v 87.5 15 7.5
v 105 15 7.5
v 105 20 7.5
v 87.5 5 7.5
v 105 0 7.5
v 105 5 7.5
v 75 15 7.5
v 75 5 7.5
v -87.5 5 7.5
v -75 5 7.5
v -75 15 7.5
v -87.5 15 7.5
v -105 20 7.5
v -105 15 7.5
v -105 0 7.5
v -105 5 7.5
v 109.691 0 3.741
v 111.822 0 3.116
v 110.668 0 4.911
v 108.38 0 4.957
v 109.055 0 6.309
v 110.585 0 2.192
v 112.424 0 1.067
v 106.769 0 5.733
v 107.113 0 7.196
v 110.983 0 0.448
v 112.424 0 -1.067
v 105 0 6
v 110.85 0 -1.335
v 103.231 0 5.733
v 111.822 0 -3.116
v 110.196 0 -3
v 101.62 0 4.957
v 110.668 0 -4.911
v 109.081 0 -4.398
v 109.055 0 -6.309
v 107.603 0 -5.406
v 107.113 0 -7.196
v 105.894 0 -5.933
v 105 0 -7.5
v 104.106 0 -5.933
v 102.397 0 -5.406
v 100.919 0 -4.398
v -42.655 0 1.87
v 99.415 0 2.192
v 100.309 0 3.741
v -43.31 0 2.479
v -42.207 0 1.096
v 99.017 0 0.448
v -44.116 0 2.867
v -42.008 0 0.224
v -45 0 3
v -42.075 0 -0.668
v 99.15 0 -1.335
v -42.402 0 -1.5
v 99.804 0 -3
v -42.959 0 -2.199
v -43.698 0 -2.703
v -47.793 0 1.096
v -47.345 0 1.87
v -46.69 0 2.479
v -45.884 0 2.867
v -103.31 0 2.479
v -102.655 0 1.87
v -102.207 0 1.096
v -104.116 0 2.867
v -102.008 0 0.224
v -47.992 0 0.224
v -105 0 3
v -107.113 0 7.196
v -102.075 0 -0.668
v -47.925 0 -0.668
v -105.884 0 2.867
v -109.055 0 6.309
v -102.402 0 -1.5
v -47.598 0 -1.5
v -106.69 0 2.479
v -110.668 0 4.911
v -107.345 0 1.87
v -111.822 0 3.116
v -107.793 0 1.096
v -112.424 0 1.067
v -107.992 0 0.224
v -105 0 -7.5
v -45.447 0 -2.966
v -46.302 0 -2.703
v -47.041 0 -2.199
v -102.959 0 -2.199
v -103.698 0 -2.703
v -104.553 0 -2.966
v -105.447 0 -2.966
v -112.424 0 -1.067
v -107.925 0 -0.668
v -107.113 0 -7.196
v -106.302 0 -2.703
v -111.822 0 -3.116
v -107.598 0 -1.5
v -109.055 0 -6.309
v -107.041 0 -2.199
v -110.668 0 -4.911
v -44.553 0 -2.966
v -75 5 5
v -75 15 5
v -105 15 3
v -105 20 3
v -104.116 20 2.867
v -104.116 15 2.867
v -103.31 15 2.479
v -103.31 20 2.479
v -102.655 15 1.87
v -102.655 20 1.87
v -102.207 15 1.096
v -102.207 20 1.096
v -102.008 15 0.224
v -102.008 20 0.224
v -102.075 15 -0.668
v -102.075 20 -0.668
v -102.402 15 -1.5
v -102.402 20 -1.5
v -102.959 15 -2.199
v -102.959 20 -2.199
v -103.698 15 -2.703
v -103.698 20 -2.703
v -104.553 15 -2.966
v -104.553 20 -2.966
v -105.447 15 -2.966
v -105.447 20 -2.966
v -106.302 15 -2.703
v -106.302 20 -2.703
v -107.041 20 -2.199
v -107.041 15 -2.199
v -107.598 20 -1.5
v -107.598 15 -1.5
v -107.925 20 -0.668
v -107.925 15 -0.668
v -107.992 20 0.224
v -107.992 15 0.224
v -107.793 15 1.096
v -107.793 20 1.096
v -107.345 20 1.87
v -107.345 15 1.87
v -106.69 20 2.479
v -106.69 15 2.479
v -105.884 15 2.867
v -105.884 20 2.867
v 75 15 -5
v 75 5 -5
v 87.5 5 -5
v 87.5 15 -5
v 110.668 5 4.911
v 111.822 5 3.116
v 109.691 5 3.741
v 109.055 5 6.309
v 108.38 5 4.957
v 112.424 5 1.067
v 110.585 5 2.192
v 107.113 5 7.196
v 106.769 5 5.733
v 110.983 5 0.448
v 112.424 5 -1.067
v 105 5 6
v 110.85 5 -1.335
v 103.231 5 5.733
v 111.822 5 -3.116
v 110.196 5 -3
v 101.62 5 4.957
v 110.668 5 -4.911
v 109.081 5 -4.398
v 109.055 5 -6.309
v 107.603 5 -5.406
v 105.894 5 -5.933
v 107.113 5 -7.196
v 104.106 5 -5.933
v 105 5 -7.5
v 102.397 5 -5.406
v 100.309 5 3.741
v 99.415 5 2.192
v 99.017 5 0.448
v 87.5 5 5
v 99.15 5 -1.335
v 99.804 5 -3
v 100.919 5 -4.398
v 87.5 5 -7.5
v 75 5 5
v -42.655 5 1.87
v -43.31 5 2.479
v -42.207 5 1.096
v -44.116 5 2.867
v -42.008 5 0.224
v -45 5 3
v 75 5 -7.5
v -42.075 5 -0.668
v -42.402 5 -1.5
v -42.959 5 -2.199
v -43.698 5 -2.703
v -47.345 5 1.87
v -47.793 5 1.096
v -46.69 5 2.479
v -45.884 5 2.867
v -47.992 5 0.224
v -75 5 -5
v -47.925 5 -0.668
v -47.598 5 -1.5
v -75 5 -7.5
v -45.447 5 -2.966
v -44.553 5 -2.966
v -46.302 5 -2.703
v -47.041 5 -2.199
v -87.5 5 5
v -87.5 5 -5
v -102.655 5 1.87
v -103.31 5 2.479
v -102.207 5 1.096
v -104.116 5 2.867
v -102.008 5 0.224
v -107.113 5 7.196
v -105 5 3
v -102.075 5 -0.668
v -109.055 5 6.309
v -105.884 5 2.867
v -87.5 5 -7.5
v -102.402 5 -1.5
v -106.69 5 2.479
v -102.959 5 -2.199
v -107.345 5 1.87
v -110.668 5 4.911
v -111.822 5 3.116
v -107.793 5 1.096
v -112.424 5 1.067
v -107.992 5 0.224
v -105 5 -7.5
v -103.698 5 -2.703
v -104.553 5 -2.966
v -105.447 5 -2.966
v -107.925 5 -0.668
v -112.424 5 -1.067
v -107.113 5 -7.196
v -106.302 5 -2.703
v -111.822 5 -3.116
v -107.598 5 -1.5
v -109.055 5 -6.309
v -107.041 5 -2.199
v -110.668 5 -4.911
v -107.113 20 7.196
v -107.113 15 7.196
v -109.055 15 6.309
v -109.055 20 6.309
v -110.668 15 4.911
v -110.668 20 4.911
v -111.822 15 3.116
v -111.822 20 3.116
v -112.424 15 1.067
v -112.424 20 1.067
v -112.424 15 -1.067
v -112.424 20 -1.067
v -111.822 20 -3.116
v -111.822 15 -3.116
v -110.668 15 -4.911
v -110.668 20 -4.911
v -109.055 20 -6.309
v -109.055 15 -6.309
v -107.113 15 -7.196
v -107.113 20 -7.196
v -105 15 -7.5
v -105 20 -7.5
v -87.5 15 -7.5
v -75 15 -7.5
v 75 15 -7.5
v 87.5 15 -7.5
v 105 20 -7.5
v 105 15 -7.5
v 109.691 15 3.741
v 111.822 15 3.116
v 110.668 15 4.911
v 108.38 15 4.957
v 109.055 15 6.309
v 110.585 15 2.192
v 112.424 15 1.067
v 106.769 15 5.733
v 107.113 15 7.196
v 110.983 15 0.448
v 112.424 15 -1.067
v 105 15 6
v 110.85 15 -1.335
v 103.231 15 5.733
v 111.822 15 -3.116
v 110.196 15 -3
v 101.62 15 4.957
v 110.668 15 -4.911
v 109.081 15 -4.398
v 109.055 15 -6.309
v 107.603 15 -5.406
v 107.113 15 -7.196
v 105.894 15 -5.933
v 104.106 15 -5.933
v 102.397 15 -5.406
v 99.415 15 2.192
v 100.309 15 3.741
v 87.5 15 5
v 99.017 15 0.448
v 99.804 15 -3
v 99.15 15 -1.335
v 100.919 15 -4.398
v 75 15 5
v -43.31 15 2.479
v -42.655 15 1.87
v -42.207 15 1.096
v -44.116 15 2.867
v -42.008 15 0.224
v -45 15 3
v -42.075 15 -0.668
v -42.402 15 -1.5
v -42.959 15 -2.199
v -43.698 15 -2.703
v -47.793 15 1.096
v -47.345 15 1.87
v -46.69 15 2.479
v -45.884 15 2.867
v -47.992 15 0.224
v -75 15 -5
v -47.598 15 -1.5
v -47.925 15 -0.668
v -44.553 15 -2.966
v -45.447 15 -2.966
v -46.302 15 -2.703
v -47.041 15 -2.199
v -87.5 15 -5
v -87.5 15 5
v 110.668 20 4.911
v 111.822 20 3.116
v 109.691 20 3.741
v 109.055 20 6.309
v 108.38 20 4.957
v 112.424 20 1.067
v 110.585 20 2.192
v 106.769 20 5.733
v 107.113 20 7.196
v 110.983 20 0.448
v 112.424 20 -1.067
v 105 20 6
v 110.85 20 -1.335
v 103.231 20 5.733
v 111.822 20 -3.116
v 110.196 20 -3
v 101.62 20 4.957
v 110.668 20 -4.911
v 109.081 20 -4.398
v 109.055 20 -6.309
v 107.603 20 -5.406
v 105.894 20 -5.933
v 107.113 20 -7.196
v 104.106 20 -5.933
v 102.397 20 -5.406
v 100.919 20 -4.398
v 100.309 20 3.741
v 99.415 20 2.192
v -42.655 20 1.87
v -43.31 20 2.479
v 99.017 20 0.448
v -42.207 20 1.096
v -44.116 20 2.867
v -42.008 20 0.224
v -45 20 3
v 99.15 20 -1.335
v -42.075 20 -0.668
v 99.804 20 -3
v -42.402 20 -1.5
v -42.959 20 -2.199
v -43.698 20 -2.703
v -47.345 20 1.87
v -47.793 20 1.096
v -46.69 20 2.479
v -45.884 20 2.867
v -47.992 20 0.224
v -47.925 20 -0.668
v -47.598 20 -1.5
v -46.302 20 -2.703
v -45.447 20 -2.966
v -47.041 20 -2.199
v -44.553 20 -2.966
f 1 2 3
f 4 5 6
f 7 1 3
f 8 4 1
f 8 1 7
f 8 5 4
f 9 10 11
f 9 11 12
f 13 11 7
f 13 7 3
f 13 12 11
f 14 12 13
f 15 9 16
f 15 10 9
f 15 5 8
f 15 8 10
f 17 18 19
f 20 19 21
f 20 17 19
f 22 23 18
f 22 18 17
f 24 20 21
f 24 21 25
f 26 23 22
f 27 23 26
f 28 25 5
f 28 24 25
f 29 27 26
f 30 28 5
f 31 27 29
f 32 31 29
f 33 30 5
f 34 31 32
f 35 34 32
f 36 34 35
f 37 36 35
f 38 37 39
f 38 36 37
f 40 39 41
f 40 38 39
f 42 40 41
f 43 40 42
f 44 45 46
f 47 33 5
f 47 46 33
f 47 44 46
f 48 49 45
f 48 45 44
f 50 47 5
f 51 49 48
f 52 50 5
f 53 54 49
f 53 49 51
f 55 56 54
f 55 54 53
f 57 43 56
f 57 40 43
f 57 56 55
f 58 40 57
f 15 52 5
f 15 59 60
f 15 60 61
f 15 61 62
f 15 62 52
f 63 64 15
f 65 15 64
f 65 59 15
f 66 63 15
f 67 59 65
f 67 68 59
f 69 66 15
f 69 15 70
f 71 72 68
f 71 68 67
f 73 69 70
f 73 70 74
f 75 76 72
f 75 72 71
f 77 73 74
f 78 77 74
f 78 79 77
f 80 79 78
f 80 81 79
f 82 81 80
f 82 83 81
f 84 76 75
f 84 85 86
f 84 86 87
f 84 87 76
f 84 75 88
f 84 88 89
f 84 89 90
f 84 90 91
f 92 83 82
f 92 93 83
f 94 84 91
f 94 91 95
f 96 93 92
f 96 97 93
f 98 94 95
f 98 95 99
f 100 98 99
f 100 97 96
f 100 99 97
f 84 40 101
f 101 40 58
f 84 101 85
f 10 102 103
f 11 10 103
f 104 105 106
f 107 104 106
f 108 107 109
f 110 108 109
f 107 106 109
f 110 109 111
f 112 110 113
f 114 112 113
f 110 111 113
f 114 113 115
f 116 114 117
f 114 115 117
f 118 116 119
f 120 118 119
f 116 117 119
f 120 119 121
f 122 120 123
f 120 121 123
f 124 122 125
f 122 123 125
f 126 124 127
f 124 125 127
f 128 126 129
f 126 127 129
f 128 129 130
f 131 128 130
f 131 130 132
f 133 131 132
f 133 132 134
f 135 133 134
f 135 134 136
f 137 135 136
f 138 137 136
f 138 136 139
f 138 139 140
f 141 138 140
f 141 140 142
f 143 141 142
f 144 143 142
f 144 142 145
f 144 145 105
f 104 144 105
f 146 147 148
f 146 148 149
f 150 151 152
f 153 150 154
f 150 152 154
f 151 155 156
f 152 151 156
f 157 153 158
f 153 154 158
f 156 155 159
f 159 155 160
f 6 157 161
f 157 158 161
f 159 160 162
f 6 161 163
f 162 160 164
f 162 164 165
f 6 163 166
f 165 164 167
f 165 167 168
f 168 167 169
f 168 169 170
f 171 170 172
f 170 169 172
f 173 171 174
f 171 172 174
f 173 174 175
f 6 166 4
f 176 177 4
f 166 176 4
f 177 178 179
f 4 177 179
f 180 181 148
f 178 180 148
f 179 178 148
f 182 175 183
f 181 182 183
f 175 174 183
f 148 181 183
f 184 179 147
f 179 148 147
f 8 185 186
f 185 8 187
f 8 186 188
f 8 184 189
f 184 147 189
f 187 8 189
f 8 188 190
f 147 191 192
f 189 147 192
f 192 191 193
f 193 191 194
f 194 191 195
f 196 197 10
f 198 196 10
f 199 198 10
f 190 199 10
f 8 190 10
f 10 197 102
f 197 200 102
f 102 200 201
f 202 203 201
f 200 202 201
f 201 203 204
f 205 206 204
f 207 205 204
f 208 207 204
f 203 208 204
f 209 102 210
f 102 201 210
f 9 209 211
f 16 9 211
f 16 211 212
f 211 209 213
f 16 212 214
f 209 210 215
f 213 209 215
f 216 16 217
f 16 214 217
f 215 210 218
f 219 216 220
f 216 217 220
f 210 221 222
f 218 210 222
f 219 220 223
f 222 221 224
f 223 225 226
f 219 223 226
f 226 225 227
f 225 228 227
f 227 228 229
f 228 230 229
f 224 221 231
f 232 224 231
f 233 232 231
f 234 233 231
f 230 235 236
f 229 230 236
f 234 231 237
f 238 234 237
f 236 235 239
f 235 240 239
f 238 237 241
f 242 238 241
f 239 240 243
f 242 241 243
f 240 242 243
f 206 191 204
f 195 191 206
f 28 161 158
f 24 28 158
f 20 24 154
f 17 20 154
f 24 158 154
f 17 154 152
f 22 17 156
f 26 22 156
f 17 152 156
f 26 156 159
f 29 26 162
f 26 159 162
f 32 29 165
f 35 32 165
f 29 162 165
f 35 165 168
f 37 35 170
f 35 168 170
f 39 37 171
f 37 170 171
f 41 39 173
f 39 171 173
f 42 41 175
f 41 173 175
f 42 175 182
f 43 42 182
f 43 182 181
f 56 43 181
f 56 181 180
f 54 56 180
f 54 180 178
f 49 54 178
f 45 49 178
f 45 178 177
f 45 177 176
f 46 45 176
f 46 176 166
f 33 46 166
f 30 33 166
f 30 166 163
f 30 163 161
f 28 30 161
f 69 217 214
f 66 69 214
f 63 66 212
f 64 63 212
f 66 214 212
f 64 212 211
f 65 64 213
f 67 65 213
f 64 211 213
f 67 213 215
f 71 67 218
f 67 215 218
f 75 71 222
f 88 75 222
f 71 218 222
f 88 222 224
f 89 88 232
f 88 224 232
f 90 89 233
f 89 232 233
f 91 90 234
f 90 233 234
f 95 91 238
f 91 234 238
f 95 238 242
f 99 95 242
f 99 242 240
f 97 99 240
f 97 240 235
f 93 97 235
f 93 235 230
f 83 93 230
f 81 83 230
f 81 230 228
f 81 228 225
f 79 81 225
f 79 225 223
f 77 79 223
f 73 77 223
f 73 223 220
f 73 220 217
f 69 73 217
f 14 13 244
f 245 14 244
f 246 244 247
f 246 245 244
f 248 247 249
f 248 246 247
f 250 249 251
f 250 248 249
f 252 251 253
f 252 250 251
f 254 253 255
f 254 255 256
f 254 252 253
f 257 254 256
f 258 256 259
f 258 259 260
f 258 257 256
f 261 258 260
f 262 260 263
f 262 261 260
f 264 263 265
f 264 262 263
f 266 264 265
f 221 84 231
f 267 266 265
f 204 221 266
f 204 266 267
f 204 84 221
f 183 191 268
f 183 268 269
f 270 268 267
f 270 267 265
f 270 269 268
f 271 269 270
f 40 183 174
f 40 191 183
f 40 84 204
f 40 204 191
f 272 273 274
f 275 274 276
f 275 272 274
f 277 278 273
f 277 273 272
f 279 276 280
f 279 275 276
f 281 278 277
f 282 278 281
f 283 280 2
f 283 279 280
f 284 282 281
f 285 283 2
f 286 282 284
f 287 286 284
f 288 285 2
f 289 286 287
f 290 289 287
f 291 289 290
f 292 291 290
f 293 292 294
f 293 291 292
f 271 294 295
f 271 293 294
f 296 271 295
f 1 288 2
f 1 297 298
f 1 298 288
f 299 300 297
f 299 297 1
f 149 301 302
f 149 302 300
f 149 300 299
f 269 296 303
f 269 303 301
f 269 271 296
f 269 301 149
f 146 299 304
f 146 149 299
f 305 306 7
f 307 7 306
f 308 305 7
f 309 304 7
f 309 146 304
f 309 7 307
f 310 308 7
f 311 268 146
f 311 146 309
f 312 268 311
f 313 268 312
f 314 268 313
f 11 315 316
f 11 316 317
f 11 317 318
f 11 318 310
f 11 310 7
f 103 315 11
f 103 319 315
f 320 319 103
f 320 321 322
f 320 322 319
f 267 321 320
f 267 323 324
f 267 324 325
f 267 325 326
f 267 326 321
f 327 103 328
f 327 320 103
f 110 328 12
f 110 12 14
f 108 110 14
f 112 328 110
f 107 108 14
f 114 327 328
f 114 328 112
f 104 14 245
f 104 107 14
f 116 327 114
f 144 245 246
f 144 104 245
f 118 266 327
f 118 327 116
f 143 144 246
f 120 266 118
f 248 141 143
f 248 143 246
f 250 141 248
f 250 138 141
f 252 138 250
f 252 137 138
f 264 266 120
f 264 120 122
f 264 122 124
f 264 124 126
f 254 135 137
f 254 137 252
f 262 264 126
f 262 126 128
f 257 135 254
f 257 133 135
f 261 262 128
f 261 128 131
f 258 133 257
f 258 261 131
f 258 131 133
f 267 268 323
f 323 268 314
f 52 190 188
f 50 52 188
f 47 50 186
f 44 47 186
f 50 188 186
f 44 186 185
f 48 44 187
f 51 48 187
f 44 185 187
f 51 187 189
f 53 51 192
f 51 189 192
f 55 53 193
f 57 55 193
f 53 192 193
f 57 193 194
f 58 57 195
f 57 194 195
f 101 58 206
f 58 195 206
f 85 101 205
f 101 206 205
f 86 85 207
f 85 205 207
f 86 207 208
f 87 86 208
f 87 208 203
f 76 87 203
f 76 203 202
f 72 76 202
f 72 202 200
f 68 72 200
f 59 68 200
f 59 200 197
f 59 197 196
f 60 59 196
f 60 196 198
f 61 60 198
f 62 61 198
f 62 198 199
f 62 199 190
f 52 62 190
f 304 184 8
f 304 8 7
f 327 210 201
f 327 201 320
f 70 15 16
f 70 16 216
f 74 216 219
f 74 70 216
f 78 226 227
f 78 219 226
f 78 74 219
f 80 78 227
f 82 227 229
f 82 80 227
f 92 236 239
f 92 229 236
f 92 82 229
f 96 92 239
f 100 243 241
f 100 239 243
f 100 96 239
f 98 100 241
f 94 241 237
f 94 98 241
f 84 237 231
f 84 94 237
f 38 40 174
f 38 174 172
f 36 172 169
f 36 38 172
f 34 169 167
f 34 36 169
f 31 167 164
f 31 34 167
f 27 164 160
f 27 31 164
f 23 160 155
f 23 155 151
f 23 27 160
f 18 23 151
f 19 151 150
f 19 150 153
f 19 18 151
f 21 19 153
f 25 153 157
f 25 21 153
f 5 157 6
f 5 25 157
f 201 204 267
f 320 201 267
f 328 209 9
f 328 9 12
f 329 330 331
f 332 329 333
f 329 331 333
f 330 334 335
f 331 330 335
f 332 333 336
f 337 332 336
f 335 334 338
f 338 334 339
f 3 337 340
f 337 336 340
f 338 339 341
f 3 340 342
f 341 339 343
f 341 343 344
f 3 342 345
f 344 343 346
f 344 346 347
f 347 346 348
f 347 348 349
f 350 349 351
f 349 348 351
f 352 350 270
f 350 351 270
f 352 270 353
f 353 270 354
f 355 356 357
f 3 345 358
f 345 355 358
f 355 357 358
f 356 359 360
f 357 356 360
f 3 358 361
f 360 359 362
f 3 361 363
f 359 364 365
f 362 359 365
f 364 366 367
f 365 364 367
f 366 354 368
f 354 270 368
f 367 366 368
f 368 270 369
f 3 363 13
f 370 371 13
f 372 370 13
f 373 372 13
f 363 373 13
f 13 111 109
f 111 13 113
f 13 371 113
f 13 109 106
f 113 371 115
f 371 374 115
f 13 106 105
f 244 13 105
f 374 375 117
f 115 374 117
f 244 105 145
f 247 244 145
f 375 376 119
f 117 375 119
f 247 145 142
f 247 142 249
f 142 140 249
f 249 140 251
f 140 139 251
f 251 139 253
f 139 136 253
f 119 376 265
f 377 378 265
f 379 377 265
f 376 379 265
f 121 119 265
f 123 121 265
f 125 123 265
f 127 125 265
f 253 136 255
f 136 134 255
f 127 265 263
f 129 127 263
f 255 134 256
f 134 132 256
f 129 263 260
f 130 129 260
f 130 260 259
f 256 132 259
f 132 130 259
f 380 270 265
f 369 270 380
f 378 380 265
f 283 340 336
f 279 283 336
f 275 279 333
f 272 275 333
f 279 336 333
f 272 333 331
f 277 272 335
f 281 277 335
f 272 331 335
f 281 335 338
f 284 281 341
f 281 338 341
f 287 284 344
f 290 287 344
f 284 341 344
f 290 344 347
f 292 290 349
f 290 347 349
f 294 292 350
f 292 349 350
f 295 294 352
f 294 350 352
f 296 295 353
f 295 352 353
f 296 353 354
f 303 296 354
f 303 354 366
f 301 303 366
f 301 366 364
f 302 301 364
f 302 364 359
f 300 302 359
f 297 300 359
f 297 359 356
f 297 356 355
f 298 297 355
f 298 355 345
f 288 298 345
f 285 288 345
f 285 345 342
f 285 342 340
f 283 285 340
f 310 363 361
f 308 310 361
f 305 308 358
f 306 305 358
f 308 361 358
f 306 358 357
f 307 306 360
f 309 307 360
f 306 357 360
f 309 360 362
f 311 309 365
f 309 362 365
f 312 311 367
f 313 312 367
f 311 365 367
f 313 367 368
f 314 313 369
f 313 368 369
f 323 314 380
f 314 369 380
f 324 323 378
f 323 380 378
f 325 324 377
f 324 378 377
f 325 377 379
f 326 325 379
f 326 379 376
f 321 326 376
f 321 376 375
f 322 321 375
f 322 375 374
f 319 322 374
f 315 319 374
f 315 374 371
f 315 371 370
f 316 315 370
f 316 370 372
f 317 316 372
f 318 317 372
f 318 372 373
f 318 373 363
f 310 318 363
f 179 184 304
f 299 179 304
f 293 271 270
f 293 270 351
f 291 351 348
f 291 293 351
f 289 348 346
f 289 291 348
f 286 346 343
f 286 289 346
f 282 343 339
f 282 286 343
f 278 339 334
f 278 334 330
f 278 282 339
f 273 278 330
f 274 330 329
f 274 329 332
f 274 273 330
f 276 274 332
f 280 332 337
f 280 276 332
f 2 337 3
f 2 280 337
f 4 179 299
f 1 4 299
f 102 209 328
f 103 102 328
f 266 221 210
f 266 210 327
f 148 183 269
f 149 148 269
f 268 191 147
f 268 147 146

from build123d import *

# Parameters (mm, degrees)
EXTRUDE_1_DEPTH     = 20
SKETCH_2_W          = 150
SKETCH_2_H          = 10
CUT_EXTRUDE_3_DEPTH = 116.244305716
SKETCH_3_W          = 25
SKETCH_3_H          = 10
CUT_EXTRUDE_4_DEPTH = 116.244305716
SKETCH_4_W          = 10
SKETCH_4_H          = 10
CUT_EXTRUDE_5_DEPTH = 202.137390855
SKETCH_5_R          = 3
SKETCH_5_R_2        = 6
CUT_EXTRUDE_6_DEPTH = 115.509824906
SKETCH_6_R          = 3
CUT_EXTRUDE_7_DEPTH = 115.509824906


with BuildPart() as part:
    # 草图1 → 凸台-拉伸1 (new body)
    with BuildSketch(Plane(origin=(0, 0, 0), x_dir=(1, 0, 0), z_dir=(0, 1, 0))):
        with BuildLine():
            Line((-105, 7.5), (105, 7.5))
            ThreePointArc((105, 7.5), (112.5, 0), (105, -7.5))
            Line((105, -7.5), (-105, -7.5))
            ThreePointArc((-105, -7.5), (-112.5, 0), (-105, 7.5))
        make_face()
    extrude(amount=EXTRUDE_1_DEPTH)

    # 草图2 → 切除-拉伸3 (cut, through all)
    with BuildSketch(Plane(origin=(0, 0, -7.5), x_dir=(-1, 0, 0), z_dir=(0, 0, -1))):
        with Locations((0, 10)):
            Rectangle(SKETCH_2_W, SKETCH_2_H)
    extrude(amount=-CUT_EXTRUDE_3_DEPTH, mode=Mode.SUBTRACT)

    # 草图3 → 切除-拉伸4 (cut, through all)
    with BuildSketch(Plane(origin=(0, 0, -7.5), x_dir=(-1, 0, 0), z_dir=(0, 0, -1))):
        with Locations((100, 10)):
            Rectangle(SKETCH_3_W, SKETCH_3_H)
        with Locations((-100, 10)):
            Rectangle(SKETCH_3_W, SKETCH_3_H)
    extrude(amount=-CUT_EXTRUDE_4_DEPTH, mode=Mode.SUBTRACT)

    # 草图4 → 切除-拉伸5 (cut, through all)
    with BuildSketch(Plane.ZY.offset(87.5)):
        with Locations((0, 10)):
            Rectangle(SKETCH_4_W, SKETCH_4_H)
    extrude(amount=-CUT_EXTRUDE_5_DEPTH, mode=Mode.SUBTRACT)

    # 草图5 → 切除-拉伸6 (cut, through all)
    with BuildSketch(Plane(origin=(0, 20, 0), x_dir=(1, 0, 0), z_dir=(0, 1, 0))):
        with Locations(Location((-105, 0, 0), (0, 0, 270))):
            Circle(SKETCH_5_R)
        with Locations(Location((105, 0, 0), (0, 0, 270))):
            Circle(SKETCH_5_R_2)
    extrude(amount=-CUT_EXTRUDE_6_DEPTH, mode=Mode.SUBTRACT)

    # 草图6 → 切除-拉伸7 (cut, through all)
    with BuildSketch(Plane(origin=(0, 20, 0), x_dir=(1, 0, 0), z_dir=(0, 1, 0))):
        with Locations(Location((-45, 0, 0), (0, 0, 270))):
            Circle(SKETCH_6_R)
    extrude(amount=-CUT_EXTRUDE_7_DEPTH, mode=Mode.SUBTRACT)


solid = part.part
